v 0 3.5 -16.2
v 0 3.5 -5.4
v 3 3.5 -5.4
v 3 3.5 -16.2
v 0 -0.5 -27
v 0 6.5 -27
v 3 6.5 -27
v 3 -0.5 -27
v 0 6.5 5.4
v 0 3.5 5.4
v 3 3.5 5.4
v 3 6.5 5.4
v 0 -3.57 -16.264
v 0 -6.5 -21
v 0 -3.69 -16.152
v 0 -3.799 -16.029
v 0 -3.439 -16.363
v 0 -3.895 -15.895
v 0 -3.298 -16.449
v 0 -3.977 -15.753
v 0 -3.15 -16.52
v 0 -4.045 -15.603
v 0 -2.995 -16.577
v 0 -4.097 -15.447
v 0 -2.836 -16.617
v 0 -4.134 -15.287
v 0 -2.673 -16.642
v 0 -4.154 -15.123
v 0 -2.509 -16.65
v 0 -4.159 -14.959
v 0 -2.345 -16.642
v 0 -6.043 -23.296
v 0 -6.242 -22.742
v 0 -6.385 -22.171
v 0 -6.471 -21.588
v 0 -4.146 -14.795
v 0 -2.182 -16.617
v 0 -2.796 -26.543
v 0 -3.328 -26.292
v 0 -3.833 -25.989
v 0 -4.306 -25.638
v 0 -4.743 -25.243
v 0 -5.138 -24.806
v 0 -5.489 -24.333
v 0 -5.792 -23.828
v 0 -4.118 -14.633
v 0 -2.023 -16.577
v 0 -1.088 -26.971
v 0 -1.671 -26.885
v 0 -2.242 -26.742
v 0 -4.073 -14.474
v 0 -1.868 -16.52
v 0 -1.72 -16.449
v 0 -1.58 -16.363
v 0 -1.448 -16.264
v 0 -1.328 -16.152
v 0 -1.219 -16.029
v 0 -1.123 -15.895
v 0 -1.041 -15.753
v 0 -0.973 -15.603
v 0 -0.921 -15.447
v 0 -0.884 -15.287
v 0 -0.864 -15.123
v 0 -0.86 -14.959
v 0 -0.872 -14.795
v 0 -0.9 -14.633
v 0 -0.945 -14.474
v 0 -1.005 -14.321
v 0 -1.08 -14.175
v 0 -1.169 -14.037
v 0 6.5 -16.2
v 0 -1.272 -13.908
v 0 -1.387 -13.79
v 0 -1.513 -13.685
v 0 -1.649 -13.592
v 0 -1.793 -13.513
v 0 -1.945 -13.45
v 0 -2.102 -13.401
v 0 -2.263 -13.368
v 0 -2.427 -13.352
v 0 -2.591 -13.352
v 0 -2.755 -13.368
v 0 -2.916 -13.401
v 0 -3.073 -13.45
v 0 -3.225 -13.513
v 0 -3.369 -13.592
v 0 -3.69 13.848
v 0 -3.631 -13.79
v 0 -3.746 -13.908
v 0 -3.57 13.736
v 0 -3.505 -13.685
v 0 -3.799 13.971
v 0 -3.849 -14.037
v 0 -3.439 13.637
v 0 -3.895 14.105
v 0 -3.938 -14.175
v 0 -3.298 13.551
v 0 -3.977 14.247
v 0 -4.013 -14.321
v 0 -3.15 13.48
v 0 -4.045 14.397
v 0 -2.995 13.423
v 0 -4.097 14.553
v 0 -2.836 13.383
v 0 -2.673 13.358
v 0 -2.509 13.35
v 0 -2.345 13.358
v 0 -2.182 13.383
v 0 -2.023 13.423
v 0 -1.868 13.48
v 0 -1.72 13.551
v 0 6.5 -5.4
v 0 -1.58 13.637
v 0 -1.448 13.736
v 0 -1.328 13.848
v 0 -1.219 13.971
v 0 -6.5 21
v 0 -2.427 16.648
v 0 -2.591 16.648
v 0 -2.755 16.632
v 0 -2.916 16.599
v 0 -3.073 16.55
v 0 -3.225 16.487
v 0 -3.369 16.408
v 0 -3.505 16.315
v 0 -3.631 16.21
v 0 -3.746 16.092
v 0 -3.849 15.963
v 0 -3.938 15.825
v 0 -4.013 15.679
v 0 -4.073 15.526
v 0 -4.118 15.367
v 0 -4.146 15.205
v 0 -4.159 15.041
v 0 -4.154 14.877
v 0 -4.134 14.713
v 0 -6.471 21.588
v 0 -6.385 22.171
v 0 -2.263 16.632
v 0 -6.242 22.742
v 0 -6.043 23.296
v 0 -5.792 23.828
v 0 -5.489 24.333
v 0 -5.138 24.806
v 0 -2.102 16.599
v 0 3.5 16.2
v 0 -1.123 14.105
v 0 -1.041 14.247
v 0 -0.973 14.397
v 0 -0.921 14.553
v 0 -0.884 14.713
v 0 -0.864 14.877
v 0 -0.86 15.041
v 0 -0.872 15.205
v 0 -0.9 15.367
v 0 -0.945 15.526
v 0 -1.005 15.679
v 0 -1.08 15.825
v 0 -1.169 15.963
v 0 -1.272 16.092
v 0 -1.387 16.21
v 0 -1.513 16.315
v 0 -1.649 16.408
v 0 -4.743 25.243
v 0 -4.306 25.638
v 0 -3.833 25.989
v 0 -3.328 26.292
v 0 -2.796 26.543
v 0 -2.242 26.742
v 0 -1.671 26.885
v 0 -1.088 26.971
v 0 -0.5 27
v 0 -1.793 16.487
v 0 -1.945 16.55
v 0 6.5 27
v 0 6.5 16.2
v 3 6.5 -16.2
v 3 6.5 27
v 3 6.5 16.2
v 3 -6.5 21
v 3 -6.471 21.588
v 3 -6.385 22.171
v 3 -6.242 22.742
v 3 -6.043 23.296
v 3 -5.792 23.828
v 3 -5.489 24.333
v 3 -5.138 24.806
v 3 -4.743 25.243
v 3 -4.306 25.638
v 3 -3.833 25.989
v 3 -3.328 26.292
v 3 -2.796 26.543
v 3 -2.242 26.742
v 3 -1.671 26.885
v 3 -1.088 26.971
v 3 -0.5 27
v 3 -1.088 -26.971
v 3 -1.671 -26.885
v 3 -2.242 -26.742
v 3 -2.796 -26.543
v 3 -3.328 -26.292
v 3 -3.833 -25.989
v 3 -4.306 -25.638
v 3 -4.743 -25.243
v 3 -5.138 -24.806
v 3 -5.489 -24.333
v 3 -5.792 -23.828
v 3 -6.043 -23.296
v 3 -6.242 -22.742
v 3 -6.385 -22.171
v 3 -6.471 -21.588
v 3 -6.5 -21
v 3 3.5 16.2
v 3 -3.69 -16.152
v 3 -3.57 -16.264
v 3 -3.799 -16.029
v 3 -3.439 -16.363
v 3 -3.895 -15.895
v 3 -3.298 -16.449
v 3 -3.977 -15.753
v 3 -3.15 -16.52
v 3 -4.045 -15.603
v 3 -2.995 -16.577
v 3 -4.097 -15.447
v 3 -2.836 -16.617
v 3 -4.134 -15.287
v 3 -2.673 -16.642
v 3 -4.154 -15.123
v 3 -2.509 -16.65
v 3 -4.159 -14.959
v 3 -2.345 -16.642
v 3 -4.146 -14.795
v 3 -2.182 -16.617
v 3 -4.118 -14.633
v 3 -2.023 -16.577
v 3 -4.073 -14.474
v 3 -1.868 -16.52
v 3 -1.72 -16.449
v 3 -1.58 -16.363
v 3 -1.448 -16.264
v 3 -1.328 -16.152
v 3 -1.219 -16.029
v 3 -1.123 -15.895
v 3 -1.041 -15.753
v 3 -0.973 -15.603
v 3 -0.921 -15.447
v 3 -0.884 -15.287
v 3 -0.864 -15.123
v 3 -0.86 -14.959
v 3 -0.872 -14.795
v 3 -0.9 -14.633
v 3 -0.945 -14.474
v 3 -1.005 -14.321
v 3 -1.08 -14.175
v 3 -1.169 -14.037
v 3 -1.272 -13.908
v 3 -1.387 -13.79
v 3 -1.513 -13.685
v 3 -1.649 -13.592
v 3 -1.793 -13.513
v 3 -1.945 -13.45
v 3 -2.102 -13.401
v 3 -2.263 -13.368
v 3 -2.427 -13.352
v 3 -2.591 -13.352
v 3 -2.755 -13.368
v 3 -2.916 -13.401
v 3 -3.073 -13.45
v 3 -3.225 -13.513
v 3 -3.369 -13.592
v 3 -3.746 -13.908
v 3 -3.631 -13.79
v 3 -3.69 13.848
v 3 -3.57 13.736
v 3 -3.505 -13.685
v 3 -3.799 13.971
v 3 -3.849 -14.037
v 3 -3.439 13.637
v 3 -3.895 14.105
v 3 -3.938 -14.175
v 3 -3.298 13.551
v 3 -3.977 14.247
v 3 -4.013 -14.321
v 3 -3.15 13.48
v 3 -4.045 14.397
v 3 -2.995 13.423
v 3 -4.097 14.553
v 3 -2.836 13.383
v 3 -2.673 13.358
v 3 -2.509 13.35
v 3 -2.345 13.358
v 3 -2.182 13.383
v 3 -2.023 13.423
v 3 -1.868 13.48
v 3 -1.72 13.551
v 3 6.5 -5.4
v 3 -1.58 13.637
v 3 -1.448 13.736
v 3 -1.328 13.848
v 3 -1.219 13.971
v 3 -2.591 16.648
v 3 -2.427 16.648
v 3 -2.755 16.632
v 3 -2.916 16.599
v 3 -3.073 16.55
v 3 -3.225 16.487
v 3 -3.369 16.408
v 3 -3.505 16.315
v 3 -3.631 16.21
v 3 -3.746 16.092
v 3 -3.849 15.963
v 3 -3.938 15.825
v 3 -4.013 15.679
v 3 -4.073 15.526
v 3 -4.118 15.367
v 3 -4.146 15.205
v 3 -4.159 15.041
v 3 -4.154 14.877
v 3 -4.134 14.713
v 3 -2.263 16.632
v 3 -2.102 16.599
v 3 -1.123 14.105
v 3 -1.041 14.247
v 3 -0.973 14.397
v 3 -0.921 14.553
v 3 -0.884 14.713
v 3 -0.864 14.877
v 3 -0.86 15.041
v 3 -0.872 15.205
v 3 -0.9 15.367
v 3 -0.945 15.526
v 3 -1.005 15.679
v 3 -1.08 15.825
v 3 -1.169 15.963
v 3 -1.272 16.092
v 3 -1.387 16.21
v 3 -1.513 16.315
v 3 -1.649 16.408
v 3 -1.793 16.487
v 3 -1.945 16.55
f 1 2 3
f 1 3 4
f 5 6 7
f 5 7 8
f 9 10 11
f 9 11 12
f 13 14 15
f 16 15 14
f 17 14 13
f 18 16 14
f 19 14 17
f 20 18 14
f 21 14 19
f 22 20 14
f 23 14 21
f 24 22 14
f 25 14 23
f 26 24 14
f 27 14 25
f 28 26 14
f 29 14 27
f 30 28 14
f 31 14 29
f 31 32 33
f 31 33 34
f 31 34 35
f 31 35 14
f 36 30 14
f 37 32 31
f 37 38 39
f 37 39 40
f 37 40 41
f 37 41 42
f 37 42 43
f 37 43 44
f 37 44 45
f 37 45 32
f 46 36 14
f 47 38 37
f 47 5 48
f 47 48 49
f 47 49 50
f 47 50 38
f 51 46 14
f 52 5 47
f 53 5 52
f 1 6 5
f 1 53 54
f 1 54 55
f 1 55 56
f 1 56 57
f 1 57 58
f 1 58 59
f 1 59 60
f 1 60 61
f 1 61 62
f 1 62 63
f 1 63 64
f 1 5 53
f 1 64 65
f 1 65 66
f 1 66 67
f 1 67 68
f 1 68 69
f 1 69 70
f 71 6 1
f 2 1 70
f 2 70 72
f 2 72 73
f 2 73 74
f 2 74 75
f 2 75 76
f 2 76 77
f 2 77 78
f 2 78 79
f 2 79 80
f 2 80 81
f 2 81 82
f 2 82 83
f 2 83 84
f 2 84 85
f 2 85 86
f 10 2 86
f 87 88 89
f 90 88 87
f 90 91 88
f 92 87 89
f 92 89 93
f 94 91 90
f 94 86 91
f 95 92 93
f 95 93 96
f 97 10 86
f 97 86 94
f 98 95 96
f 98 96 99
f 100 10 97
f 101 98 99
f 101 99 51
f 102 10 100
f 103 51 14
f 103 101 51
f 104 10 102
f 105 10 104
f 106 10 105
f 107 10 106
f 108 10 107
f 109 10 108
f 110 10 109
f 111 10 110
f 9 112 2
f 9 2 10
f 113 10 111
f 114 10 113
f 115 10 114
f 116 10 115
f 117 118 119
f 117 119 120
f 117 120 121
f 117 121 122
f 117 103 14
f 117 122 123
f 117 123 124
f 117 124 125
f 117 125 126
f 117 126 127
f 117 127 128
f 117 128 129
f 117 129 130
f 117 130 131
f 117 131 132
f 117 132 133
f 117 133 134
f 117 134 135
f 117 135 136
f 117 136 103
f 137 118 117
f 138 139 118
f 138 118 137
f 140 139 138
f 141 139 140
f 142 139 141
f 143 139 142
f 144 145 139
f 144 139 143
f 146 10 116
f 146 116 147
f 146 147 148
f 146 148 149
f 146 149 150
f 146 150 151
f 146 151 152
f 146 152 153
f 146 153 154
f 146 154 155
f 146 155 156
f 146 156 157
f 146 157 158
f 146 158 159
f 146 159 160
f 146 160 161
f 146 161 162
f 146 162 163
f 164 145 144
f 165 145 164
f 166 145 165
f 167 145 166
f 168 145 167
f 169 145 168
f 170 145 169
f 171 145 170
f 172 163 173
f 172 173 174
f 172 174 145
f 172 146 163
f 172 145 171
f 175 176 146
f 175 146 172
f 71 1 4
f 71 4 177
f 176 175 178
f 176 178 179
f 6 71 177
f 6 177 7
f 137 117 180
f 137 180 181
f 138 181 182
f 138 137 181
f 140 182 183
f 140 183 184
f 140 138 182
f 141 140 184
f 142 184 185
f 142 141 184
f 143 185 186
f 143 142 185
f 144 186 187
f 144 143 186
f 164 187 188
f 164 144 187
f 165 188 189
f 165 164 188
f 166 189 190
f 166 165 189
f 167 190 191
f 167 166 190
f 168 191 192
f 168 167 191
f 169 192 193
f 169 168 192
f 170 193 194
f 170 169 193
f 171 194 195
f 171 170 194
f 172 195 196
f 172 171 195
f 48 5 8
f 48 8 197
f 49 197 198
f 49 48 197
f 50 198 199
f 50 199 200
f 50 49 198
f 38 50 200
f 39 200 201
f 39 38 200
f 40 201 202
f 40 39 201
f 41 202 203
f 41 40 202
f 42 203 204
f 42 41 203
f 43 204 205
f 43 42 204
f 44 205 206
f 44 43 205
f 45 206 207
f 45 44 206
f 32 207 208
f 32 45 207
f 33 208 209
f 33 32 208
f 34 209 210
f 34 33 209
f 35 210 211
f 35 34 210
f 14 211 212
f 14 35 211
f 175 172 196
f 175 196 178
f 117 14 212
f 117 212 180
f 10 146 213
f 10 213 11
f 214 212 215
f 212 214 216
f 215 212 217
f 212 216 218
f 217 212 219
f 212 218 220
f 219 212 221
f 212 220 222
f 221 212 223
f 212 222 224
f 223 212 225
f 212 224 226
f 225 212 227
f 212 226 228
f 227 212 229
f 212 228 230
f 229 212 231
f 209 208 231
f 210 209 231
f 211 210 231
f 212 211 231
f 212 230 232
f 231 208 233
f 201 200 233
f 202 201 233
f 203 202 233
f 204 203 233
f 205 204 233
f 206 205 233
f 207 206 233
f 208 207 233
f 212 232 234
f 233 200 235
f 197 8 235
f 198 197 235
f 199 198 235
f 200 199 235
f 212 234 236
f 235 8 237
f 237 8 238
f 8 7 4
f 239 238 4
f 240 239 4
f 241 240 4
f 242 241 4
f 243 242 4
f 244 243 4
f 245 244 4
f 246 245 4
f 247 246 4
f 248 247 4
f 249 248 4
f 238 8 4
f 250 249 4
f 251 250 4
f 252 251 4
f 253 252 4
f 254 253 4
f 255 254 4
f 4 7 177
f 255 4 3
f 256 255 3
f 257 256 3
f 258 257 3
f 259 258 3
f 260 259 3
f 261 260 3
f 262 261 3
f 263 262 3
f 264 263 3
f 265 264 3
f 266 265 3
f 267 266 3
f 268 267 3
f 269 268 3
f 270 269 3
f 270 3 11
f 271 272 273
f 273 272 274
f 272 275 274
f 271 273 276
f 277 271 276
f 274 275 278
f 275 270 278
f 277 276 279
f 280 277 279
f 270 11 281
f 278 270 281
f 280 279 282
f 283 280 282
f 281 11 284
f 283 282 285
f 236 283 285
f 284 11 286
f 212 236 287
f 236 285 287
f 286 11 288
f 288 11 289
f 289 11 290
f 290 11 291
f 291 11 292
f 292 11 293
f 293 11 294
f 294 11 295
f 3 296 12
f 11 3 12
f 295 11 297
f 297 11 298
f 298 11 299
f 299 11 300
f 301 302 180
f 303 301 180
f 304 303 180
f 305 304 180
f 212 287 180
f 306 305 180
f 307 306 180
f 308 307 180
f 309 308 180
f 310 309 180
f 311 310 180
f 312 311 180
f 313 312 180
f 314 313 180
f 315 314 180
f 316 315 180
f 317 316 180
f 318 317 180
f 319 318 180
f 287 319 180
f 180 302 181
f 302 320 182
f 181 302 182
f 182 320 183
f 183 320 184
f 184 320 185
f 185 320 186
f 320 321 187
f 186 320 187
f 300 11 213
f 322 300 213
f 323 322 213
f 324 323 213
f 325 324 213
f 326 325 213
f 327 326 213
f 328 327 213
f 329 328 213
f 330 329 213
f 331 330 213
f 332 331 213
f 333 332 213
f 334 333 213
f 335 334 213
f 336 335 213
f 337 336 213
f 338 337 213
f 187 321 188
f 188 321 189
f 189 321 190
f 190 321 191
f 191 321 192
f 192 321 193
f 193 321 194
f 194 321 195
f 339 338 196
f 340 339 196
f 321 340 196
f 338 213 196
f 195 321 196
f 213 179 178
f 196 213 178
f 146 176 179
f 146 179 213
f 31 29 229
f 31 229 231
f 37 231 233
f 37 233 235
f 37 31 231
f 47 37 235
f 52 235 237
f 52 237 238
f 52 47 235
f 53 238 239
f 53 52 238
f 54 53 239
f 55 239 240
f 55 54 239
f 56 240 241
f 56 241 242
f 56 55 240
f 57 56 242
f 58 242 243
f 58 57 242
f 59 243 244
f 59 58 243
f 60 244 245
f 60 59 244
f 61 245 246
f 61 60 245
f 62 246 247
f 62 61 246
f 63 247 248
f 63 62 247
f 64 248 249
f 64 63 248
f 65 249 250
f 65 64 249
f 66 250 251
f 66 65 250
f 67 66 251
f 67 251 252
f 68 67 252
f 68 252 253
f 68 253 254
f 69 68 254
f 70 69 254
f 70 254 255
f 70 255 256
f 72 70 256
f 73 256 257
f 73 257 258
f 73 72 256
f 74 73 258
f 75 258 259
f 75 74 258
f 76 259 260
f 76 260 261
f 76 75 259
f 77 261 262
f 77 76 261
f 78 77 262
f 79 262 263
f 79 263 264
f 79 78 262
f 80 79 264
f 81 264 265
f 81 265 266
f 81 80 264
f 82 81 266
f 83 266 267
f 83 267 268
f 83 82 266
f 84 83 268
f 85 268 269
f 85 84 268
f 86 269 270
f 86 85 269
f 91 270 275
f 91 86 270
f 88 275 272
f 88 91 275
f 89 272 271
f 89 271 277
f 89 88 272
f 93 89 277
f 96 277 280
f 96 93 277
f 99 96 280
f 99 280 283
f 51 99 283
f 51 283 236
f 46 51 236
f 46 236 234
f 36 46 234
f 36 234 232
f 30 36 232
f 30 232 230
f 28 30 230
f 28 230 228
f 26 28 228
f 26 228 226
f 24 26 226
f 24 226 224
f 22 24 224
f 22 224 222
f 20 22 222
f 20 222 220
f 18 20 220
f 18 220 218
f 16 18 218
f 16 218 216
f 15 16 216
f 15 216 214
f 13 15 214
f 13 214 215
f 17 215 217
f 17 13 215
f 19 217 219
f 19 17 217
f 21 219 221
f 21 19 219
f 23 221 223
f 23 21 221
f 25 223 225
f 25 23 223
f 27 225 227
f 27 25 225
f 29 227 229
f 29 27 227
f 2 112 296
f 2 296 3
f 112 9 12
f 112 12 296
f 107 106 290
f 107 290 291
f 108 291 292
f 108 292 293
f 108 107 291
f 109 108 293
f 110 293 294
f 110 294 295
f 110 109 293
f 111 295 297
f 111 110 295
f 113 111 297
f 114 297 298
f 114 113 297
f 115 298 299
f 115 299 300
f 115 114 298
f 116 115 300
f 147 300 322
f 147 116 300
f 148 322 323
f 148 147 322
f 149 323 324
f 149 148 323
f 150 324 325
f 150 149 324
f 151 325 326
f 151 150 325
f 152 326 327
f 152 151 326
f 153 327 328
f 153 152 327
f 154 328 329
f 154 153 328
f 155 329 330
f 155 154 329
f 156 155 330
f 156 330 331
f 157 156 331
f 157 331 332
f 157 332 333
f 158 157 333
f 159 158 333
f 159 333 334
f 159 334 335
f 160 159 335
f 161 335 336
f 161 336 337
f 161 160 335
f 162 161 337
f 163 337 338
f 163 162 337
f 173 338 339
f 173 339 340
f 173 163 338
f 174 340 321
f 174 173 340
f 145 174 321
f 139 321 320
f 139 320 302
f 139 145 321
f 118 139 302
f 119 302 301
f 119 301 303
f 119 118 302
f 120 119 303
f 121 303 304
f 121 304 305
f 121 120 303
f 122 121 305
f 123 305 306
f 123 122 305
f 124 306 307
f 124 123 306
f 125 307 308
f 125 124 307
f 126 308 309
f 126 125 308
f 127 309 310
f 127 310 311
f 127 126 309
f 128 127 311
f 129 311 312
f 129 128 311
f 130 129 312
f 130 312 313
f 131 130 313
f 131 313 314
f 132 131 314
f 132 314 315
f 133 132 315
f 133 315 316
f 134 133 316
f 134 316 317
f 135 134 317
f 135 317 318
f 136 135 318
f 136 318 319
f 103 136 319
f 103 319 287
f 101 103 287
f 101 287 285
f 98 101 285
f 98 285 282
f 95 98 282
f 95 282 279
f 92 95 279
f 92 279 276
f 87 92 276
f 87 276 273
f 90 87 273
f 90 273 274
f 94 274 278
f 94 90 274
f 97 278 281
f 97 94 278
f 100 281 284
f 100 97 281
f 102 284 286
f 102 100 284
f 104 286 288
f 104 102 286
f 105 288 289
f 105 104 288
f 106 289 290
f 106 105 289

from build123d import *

# Parameters (mm, degrees)
SKETCH1_R           = 1.65
BOSS_EXTRUDE1_DEPTH = 3


with BuildPart() as part:
    # Sketch1 → Boss-Extrude1 (new body)
    with BuildSketch(Plane(origin=(0, 0, 0), x_dir=(0, 0, -1), z_dir=(1, 0, 0))):
        with BuildLine():
            Line((21, -6.5), (-21, -6.5))
            ThreePointArc((-21, -6.5), (-25.242640687, -4.742640687), (-27, -0.5))
            Line((-27, -0.5), (-27, 6.5))
            Line((-27, 6.5), (-16.2, 6.5))
            Line((-16.2, 6.5), (-16.2, 3.5))
            Line((-16.2, 3.5), (-5.4, 3.5))
            Line((-5.4, 3.5), (-5.4, 6.5))
            Line((-5.4, 6.5), (5.4, 6.5))
            Line((5.4, 6.5), (5.4, 3.5))
            Line((5.4, 3.5), (16.2, 3.5))
            Line((16.2, 3.5), (16.2, 6.5))
            Line((16.2, 6.5), (27, 6.5))
            Line((27, 6.5), (27, -0.5))
            ThreePointArc((27, -0.5), (25.242640687, -4.742640687), (21, -6.5))
        make_face()
        with Locations((-15, -2.509032308)):
            Circle(SKETCH1_R, mode=Mode.SUBTRACT)
        with Locations((15, -2.509032308)):
            Circle(SKETCH1_R, mode=Mode.SUBTRACT)
    extrude(amount=BOSS_EXTRUDE1_DEPTH)


solid = part.part
